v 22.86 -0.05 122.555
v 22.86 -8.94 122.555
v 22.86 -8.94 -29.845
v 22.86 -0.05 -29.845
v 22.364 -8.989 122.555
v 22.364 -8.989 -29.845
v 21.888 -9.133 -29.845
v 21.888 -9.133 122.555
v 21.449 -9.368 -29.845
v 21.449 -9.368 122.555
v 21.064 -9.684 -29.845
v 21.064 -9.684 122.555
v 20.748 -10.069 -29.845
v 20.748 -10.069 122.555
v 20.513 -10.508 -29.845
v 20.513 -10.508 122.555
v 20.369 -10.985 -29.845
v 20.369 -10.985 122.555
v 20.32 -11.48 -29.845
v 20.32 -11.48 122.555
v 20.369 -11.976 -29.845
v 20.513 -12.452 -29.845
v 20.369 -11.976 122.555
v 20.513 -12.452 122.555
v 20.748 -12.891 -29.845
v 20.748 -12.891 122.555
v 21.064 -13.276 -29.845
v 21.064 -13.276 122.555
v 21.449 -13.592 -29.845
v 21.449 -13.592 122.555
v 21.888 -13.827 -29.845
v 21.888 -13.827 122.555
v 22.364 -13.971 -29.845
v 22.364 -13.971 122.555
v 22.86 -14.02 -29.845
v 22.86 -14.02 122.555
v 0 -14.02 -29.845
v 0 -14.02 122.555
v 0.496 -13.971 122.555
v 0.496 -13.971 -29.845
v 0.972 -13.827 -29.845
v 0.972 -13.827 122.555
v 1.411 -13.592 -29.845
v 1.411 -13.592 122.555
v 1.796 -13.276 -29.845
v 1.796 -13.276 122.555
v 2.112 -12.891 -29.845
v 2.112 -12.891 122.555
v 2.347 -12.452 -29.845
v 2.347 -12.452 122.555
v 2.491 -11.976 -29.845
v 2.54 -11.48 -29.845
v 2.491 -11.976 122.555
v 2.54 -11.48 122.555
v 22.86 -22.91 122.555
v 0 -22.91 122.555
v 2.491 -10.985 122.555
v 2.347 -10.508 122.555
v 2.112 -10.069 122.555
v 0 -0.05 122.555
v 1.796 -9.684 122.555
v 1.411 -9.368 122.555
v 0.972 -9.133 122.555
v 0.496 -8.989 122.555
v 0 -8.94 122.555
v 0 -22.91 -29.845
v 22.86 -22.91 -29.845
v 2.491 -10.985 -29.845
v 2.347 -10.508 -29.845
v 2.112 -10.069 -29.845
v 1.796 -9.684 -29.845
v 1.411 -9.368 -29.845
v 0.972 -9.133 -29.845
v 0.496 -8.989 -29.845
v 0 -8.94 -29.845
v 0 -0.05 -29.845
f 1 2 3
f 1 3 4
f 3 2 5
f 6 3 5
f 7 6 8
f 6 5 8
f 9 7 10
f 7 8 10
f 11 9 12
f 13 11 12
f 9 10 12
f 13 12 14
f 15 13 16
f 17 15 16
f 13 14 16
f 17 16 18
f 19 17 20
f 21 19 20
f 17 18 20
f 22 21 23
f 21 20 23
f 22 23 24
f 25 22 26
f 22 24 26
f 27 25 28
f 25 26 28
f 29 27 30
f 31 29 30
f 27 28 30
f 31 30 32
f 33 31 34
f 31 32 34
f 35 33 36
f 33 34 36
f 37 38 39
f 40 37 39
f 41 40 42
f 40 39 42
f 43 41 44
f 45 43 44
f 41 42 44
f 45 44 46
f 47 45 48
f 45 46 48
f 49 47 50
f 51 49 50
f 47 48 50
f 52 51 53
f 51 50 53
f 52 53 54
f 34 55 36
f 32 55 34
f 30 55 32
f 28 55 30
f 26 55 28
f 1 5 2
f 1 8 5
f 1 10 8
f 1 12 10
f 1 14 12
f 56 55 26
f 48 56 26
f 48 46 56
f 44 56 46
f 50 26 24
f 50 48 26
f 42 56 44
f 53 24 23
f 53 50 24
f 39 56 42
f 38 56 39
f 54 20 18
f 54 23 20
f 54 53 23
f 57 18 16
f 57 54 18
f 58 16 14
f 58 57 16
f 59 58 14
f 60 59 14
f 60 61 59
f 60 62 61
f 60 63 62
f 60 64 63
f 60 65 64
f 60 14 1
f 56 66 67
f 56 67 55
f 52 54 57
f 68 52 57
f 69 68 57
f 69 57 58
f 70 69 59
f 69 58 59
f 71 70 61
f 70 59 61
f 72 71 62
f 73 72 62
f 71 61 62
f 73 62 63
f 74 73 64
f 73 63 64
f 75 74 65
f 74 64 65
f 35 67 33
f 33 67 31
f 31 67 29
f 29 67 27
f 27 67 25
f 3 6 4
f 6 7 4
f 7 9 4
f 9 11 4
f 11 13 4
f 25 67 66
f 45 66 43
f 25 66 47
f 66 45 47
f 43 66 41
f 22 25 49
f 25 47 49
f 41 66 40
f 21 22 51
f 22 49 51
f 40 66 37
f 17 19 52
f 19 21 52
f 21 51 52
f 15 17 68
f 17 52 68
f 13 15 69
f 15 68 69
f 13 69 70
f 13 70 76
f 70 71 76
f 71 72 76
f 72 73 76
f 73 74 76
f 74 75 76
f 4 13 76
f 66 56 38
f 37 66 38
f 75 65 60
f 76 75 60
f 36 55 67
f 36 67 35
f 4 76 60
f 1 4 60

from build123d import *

# Parameters (mm, degrees)
F0_W     = 22.86
F0_H     = 152.4
F1_DEPTH = 22.86
F3_DEPTH = 152.4
F5_DEPTH = 152.4


with BuildPart() as f1:
    # F0 (on Right) → F1 (new body)
    with BuildSketch(Plane.YZ):
        with Locations((-11.480133, 46.355159)):
            Rectangle(F0_W, F0_H)
    extrude(amount=F1_DEPTH)

    # F2 (on face) → F3 (cut)
    with BuildSketch(Plane.XY.offset(122.555159)):
        with BuildLine():
            Line((22.86, -14.020133), (22.86, -8.940133))
            ThreePointArc((22.86, -8.940133), (20.32, -11.480133), (22.86, -14.020133))
        make_face()
        with BuildLine():
            Line((0, -14.020133), (0, -8.940133))
            ThreePointArc((0, -8.940133), (-2.54, -11.480133), (0, -14.020133))
        make_face()
        with BuildLine():
            ThreePointArc((22.86, -14.020133), (24.656051, -13.276184), (25.4, -11.480133))
            ThreePointArc((25.4, -11.480133), (24.656051, -9.684082), (22.86, -8.940133))
            Line((22.86, -8.940133), (22.86, -14.020133))
        make_face()
    extrude(amount=-F3_DEPTH, mode=Mode.SUBTRACT)

    # F4 (on face) → F5 (cut)
    with BuildSketch(Plane.XY.offset(122.555159)):
        with BuildLine():
            ThreePointArc((0, -14.020133), (1.796051, -13.276184), (2.54, -11.480133))
            ThreePointArc((2.54, -11.480133), (1.796051, -9.684082), (0, -8.940133))
            Line((0, -8.940133), (0, -14.020133))
        make_face()
    extrude(amount=-F5_DEPTH, mode=Mode.SUBTRACT)


solid = f1.part
